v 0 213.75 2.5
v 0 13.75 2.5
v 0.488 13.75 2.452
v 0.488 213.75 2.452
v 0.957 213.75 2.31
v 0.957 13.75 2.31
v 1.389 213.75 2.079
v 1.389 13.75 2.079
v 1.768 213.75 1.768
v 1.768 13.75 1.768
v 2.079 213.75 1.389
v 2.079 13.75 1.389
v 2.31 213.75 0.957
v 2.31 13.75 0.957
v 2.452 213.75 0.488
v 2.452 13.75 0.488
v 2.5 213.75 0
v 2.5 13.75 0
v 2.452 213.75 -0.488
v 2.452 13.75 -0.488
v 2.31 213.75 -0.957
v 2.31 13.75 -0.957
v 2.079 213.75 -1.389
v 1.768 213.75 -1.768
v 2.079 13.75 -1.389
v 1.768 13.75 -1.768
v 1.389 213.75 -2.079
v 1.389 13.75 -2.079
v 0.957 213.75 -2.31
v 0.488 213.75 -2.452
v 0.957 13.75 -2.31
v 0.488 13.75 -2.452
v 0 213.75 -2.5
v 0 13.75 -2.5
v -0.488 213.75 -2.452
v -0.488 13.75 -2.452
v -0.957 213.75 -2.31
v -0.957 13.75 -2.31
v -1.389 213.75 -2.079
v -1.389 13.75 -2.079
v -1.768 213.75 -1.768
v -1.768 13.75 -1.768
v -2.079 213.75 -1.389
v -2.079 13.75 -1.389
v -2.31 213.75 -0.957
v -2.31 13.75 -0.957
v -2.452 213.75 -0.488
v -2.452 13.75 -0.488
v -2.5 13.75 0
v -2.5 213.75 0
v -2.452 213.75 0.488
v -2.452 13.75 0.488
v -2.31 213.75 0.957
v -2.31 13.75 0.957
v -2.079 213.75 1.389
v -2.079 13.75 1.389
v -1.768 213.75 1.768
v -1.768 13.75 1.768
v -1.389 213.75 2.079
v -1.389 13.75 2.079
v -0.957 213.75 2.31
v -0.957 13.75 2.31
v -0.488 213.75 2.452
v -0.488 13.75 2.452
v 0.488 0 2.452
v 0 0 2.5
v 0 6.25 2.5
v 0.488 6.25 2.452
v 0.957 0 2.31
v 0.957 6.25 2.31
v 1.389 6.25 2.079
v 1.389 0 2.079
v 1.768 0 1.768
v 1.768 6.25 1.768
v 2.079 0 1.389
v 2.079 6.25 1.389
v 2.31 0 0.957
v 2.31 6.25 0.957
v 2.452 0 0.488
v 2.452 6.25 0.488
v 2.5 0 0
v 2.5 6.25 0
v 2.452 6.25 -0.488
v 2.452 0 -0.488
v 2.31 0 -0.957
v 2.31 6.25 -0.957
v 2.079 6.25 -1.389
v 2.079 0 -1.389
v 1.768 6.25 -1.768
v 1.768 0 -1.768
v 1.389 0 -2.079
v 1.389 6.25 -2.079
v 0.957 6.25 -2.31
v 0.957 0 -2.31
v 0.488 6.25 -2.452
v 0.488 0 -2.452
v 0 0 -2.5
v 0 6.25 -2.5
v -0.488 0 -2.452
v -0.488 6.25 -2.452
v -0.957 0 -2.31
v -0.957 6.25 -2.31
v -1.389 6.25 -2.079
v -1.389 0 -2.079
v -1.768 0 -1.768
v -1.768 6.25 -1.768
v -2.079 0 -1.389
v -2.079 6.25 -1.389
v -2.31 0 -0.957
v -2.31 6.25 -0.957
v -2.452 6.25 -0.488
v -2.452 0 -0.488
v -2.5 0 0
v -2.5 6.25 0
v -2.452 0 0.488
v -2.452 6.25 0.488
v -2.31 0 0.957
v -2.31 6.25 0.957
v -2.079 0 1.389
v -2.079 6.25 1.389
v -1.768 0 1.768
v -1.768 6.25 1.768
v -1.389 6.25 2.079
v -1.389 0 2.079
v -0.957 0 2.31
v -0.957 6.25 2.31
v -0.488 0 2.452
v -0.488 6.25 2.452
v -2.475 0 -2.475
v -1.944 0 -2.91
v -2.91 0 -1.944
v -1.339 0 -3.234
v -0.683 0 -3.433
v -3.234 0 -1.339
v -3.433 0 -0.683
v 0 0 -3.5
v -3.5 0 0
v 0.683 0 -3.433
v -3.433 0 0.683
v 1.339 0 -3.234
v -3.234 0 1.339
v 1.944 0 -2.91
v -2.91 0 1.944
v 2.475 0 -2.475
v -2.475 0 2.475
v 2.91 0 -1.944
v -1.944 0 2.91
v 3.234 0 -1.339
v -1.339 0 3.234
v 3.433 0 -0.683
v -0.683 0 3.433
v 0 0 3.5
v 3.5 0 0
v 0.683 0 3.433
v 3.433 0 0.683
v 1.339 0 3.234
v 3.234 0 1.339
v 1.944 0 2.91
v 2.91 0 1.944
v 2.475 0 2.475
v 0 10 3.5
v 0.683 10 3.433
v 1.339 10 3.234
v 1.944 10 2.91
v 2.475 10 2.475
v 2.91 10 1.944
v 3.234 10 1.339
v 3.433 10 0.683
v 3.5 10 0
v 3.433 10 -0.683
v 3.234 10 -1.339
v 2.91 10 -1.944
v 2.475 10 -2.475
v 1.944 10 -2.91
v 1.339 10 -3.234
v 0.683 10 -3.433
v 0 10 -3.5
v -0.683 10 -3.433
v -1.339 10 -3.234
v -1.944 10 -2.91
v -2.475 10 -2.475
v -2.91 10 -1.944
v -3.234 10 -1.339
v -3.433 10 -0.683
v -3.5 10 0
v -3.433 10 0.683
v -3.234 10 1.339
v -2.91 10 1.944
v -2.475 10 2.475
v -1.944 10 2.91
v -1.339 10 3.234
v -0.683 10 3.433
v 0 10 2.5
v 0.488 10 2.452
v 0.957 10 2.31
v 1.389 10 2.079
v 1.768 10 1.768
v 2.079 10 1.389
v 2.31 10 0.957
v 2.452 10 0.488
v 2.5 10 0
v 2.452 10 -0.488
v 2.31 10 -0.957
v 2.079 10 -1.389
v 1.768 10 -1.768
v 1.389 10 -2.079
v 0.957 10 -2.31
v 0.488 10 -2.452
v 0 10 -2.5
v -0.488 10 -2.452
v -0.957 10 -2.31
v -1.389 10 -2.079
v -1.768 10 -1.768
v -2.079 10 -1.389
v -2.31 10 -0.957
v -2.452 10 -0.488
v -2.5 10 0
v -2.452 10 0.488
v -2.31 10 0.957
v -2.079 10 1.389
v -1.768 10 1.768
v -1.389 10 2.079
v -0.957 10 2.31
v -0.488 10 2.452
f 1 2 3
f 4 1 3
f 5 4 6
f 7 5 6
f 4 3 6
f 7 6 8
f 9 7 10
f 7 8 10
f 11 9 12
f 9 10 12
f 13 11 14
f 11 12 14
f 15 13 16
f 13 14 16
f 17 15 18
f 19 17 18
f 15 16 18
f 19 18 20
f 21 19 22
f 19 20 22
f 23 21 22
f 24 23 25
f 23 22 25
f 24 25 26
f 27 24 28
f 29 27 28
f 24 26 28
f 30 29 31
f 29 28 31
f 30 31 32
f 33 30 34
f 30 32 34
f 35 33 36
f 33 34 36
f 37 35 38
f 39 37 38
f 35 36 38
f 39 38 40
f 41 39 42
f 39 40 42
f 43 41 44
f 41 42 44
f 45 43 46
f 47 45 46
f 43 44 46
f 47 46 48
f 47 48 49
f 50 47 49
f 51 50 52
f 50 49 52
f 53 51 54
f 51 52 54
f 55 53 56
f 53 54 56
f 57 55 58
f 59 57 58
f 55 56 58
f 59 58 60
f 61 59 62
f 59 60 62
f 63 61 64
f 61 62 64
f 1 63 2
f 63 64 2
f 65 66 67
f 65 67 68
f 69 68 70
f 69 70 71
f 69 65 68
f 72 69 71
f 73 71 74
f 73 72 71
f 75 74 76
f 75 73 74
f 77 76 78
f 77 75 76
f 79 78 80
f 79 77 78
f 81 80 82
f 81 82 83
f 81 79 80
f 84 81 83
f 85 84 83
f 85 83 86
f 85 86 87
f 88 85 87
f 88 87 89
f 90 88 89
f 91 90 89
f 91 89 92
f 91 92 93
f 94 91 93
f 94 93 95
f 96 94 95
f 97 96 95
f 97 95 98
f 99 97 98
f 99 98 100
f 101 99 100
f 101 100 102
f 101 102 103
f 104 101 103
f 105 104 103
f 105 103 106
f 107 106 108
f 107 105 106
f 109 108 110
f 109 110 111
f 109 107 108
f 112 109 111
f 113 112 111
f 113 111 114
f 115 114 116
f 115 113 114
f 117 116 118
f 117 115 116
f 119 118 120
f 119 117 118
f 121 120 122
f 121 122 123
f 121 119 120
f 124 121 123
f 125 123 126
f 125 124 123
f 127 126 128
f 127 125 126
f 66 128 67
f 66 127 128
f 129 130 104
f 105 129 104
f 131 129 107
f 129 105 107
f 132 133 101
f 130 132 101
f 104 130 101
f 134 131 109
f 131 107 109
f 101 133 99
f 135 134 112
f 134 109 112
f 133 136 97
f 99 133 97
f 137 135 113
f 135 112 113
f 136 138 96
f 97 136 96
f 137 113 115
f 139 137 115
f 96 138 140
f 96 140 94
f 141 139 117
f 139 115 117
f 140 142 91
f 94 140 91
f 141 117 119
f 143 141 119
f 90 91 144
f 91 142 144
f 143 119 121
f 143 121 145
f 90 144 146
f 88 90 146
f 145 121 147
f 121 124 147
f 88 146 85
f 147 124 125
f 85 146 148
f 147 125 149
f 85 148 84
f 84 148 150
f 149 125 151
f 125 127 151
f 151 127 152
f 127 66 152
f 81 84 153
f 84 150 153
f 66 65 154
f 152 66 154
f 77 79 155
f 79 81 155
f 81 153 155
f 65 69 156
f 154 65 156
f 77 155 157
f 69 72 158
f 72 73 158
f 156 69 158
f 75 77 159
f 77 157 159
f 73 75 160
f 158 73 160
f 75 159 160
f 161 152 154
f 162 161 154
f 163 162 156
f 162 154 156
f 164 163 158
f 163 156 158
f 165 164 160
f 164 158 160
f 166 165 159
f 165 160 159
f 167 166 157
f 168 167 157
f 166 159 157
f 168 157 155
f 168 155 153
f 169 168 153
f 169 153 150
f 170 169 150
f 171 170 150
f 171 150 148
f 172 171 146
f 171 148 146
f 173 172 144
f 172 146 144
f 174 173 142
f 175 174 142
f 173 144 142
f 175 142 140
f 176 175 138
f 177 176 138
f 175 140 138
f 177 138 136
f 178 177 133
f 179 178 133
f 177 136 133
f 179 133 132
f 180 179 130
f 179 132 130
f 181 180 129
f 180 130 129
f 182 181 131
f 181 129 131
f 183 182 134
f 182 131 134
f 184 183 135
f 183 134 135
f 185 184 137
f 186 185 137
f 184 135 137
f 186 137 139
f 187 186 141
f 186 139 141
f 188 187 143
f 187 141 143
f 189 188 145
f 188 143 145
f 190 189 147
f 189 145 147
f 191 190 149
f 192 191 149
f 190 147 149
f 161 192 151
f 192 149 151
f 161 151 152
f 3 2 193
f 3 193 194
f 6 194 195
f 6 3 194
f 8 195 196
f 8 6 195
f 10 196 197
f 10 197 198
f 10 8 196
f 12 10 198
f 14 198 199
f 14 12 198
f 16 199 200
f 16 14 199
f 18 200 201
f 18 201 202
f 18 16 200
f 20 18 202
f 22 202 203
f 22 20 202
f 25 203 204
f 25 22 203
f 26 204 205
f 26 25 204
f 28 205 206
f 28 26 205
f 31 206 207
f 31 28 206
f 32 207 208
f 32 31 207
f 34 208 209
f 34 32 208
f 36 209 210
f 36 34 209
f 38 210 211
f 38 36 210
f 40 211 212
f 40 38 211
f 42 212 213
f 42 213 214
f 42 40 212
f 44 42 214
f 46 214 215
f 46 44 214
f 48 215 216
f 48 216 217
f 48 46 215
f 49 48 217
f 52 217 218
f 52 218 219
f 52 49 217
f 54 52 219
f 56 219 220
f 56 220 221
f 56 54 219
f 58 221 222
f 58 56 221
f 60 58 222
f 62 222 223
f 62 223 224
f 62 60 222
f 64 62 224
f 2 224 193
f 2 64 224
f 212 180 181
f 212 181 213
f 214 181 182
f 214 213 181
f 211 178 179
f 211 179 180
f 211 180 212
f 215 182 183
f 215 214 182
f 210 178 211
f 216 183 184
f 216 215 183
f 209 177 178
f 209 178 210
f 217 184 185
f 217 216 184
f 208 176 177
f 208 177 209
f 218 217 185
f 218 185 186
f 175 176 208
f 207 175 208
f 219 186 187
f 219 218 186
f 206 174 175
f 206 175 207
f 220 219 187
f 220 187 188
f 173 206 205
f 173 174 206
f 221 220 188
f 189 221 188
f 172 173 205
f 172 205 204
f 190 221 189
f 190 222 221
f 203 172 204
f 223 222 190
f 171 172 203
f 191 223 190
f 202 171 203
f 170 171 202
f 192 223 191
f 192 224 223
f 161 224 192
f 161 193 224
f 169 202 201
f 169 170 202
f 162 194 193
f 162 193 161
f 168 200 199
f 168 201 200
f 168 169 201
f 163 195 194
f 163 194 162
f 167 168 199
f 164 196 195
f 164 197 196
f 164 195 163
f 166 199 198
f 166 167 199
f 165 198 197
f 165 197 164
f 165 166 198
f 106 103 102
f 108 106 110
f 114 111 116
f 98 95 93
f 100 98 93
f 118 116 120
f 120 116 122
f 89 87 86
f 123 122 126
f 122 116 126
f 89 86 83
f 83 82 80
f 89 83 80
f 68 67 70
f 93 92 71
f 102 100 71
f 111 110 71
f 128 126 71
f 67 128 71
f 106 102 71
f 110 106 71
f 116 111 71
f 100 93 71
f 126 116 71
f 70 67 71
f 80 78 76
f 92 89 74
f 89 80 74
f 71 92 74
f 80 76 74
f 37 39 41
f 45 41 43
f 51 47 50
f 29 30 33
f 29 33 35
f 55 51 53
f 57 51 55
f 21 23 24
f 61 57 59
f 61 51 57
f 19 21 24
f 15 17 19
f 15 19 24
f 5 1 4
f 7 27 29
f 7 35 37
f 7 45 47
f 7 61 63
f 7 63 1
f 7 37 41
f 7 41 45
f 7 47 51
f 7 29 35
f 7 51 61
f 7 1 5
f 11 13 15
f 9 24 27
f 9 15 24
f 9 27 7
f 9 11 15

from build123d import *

# Parameters (mm, degrees)
SKETCH1_R           = 3.5
SKETCH1_R_2         = 2.5
BOSS_EXTRUDE1_DEPTH = 10
SKETCH2_R           = 2.5
BOSS_EXTRUDE2_DEPTH = 3.75
SKETCH3_R           = 2.5
BOSS_EXTRUDE3_DEPTH = 200


with BuildPart() as part:
    # Sketch1 → Boss-Extrude1 (new body)
    with BuildSketch(Plane(origin=(0, 0, 0), x_dir=(1, 0, 0), z_dir=(0, 1, 0))):
        with Locations(Location((0, 0, 0), (0, 0, 270))):
            Circle(SKETCH1_R)
        with Locations(Location((0, 0, 0), (0, 0, 270))):
            Circle(SKETCH1_R_2, mode=Mode.SUBTRACT)
    extrude(amount=BOSS_EXTRUDE1_DEPTH)

    # Sketch2 → Boss-Extrude2 (add, symmetric)
    with BuildSketch(Plane(origin=(0, 10, 0), x_dir=(1, 0, 0), z_dir=(0, 1, 0))):
        with Locations(Location((0, 0, 0), (0, 0, 270))):
            Circle(SKETCH2_R)
    extrude(amount=BOSS_EXTRUDE2_DEPTH, both=True)

    # Sketch3 → Boss-Extrude3 (add)
    with BuildSketch(Plane(origin=(0, 13.75, 0), x_dir=(1, 0, 0), z_dir=(0, 1, 0))):
        with Locations(Location((0, 0, 0), (0, 0, 270))):
            Circle(SKETCH3_R)
    extrude(amount=BOSS_EXTRUDE3_DEPTH)


solid = part.part
